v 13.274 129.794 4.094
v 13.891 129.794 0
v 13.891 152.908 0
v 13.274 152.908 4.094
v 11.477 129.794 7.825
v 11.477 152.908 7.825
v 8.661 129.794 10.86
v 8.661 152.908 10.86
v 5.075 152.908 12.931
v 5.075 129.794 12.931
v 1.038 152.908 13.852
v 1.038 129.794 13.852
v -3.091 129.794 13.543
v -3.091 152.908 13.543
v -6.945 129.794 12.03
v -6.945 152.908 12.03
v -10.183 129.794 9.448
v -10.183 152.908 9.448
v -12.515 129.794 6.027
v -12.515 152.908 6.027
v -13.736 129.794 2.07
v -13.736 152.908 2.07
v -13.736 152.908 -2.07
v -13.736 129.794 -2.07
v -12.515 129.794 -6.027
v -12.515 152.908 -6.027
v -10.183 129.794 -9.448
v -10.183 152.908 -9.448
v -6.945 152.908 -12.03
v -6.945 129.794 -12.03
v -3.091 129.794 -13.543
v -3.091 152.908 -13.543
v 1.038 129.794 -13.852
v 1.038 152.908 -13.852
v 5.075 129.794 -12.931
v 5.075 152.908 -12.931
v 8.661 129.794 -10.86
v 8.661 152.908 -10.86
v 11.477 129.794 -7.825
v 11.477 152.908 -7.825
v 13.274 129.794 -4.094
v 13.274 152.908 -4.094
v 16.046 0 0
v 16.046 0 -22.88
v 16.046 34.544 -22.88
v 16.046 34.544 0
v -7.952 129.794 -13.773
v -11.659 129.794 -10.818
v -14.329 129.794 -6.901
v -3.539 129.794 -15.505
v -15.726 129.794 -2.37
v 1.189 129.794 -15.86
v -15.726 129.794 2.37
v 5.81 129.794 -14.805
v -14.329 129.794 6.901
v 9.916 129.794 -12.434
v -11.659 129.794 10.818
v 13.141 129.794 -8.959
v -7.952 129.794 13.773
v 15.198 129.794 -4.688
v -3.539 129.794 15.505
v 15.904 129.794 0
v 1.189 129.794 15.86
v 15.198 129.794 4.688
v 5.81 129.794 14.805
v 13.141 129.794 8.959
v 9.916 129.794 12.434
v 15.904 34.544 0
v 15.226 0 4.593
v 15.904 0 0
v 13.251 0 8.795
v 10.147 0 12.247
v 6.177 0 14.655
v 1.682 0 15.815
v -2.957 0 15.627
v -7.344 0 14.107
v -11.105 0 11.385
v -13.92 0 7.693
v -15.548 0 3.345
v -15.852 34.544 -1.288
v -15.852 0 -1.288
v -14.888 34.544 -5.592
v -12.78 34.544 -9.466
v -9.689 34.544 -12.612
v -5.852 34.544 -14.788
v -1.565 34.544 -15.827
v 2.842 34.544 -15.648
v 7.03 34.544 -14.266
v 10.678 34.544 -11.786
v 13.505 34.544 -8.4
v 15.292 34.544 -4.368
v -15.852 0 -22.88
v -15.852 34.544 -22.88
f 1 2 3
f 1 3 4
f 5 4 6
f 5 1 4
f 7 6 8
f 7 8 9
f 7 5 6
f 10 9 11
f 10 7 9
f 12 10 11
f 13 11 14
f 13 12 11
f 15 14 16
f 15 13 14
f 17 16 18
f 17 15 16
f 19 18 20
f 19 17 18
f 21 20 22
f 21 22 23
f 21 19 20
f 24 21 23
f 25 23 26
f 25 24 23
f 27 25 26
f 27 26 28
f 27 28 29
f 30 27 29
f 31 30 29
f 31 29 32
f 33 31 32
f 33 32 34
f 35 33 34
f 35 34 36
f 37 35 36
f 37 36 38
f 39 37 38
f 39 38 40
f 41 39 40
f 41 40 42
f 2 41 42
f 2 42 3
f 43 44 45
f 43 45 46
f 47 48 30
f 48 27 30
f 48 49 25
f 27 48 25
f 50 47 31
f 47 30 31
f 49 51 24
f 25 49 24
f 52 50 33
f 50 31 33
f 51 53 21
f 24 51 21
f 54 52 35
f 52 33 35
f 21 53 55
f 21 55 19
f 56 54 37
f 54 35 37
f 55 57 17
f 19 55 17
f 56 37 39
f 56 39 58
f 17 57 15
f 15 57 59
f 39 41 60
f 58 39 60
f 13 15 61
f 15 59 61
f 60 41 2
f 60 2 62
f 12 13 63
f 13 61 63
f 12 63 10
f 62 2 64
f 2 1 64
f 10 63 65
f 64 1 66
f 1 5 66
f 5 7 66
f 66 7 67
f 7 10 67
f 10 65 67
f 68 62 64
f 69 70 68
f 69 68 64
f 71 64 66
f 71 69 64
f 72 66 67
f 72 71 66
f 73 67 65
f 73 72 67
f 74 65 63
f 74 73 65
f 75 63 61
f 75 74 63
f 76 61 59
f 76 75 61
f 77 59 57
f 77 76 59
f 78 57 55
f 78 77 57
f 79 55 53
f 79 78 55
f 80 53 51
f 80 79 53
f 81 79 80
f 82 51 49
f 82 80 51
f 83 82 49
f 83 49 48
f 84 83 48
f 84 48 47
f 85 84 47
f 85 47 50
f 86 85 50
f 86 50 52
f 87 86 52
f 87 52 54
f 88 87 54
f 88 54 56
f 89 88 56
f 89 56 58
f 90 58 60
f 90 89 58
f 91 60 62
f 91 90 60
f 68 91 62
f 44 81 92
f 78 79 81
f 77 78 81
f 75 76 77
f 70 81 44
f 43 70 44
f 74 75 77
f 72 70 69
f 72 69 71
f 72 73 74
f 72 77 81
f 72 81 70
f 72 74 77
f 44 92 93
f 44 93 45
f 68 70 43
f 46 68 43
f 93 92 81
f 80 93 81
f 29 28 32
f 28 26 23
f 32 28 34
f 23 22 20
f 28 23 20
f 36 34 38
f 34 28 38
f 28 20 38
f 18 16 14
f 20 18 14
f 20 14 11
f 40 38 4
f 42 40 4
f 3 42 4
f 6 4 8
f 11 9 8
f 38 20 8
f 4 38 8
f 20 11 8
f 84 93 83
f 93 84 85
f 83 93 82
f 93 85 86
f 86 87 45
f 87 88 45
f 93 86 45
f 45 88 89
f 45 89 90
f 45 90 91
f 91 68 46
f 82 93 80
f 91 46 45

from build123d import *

# Parameters (mm, degrees)
F0_R     = 15.904078
F1_DEPTH = 129.794
F2_W     = 31.898258
F2_H     = 22.879753
F3_DEPTH = 34.544
F4_R     = 13.890784
F5_DEPTH = 152.908


with BuildPart() as f1:
    # F0 (on Front) → F1 (new body)
    with BuildSketch(Plane.XZ):
        Circle(F0_R)
    extrude(amount=-F1_DEPTH)

    # F2 (on Front) → F3 (join)
    with BuildSketch(Plane.XZ):
        with Locations((0.097296, -11.439876)):
            Rectangle(F2_W, F2_H)
    extrude(amount=-F3_DEPTH)

    # F4 (on Front) → F5 (join)
    with BuildSketch(Plane.XZ):
        Circle(F4_R)
    extrude(amount=-F5_DEPTH)


solid = f1.part
